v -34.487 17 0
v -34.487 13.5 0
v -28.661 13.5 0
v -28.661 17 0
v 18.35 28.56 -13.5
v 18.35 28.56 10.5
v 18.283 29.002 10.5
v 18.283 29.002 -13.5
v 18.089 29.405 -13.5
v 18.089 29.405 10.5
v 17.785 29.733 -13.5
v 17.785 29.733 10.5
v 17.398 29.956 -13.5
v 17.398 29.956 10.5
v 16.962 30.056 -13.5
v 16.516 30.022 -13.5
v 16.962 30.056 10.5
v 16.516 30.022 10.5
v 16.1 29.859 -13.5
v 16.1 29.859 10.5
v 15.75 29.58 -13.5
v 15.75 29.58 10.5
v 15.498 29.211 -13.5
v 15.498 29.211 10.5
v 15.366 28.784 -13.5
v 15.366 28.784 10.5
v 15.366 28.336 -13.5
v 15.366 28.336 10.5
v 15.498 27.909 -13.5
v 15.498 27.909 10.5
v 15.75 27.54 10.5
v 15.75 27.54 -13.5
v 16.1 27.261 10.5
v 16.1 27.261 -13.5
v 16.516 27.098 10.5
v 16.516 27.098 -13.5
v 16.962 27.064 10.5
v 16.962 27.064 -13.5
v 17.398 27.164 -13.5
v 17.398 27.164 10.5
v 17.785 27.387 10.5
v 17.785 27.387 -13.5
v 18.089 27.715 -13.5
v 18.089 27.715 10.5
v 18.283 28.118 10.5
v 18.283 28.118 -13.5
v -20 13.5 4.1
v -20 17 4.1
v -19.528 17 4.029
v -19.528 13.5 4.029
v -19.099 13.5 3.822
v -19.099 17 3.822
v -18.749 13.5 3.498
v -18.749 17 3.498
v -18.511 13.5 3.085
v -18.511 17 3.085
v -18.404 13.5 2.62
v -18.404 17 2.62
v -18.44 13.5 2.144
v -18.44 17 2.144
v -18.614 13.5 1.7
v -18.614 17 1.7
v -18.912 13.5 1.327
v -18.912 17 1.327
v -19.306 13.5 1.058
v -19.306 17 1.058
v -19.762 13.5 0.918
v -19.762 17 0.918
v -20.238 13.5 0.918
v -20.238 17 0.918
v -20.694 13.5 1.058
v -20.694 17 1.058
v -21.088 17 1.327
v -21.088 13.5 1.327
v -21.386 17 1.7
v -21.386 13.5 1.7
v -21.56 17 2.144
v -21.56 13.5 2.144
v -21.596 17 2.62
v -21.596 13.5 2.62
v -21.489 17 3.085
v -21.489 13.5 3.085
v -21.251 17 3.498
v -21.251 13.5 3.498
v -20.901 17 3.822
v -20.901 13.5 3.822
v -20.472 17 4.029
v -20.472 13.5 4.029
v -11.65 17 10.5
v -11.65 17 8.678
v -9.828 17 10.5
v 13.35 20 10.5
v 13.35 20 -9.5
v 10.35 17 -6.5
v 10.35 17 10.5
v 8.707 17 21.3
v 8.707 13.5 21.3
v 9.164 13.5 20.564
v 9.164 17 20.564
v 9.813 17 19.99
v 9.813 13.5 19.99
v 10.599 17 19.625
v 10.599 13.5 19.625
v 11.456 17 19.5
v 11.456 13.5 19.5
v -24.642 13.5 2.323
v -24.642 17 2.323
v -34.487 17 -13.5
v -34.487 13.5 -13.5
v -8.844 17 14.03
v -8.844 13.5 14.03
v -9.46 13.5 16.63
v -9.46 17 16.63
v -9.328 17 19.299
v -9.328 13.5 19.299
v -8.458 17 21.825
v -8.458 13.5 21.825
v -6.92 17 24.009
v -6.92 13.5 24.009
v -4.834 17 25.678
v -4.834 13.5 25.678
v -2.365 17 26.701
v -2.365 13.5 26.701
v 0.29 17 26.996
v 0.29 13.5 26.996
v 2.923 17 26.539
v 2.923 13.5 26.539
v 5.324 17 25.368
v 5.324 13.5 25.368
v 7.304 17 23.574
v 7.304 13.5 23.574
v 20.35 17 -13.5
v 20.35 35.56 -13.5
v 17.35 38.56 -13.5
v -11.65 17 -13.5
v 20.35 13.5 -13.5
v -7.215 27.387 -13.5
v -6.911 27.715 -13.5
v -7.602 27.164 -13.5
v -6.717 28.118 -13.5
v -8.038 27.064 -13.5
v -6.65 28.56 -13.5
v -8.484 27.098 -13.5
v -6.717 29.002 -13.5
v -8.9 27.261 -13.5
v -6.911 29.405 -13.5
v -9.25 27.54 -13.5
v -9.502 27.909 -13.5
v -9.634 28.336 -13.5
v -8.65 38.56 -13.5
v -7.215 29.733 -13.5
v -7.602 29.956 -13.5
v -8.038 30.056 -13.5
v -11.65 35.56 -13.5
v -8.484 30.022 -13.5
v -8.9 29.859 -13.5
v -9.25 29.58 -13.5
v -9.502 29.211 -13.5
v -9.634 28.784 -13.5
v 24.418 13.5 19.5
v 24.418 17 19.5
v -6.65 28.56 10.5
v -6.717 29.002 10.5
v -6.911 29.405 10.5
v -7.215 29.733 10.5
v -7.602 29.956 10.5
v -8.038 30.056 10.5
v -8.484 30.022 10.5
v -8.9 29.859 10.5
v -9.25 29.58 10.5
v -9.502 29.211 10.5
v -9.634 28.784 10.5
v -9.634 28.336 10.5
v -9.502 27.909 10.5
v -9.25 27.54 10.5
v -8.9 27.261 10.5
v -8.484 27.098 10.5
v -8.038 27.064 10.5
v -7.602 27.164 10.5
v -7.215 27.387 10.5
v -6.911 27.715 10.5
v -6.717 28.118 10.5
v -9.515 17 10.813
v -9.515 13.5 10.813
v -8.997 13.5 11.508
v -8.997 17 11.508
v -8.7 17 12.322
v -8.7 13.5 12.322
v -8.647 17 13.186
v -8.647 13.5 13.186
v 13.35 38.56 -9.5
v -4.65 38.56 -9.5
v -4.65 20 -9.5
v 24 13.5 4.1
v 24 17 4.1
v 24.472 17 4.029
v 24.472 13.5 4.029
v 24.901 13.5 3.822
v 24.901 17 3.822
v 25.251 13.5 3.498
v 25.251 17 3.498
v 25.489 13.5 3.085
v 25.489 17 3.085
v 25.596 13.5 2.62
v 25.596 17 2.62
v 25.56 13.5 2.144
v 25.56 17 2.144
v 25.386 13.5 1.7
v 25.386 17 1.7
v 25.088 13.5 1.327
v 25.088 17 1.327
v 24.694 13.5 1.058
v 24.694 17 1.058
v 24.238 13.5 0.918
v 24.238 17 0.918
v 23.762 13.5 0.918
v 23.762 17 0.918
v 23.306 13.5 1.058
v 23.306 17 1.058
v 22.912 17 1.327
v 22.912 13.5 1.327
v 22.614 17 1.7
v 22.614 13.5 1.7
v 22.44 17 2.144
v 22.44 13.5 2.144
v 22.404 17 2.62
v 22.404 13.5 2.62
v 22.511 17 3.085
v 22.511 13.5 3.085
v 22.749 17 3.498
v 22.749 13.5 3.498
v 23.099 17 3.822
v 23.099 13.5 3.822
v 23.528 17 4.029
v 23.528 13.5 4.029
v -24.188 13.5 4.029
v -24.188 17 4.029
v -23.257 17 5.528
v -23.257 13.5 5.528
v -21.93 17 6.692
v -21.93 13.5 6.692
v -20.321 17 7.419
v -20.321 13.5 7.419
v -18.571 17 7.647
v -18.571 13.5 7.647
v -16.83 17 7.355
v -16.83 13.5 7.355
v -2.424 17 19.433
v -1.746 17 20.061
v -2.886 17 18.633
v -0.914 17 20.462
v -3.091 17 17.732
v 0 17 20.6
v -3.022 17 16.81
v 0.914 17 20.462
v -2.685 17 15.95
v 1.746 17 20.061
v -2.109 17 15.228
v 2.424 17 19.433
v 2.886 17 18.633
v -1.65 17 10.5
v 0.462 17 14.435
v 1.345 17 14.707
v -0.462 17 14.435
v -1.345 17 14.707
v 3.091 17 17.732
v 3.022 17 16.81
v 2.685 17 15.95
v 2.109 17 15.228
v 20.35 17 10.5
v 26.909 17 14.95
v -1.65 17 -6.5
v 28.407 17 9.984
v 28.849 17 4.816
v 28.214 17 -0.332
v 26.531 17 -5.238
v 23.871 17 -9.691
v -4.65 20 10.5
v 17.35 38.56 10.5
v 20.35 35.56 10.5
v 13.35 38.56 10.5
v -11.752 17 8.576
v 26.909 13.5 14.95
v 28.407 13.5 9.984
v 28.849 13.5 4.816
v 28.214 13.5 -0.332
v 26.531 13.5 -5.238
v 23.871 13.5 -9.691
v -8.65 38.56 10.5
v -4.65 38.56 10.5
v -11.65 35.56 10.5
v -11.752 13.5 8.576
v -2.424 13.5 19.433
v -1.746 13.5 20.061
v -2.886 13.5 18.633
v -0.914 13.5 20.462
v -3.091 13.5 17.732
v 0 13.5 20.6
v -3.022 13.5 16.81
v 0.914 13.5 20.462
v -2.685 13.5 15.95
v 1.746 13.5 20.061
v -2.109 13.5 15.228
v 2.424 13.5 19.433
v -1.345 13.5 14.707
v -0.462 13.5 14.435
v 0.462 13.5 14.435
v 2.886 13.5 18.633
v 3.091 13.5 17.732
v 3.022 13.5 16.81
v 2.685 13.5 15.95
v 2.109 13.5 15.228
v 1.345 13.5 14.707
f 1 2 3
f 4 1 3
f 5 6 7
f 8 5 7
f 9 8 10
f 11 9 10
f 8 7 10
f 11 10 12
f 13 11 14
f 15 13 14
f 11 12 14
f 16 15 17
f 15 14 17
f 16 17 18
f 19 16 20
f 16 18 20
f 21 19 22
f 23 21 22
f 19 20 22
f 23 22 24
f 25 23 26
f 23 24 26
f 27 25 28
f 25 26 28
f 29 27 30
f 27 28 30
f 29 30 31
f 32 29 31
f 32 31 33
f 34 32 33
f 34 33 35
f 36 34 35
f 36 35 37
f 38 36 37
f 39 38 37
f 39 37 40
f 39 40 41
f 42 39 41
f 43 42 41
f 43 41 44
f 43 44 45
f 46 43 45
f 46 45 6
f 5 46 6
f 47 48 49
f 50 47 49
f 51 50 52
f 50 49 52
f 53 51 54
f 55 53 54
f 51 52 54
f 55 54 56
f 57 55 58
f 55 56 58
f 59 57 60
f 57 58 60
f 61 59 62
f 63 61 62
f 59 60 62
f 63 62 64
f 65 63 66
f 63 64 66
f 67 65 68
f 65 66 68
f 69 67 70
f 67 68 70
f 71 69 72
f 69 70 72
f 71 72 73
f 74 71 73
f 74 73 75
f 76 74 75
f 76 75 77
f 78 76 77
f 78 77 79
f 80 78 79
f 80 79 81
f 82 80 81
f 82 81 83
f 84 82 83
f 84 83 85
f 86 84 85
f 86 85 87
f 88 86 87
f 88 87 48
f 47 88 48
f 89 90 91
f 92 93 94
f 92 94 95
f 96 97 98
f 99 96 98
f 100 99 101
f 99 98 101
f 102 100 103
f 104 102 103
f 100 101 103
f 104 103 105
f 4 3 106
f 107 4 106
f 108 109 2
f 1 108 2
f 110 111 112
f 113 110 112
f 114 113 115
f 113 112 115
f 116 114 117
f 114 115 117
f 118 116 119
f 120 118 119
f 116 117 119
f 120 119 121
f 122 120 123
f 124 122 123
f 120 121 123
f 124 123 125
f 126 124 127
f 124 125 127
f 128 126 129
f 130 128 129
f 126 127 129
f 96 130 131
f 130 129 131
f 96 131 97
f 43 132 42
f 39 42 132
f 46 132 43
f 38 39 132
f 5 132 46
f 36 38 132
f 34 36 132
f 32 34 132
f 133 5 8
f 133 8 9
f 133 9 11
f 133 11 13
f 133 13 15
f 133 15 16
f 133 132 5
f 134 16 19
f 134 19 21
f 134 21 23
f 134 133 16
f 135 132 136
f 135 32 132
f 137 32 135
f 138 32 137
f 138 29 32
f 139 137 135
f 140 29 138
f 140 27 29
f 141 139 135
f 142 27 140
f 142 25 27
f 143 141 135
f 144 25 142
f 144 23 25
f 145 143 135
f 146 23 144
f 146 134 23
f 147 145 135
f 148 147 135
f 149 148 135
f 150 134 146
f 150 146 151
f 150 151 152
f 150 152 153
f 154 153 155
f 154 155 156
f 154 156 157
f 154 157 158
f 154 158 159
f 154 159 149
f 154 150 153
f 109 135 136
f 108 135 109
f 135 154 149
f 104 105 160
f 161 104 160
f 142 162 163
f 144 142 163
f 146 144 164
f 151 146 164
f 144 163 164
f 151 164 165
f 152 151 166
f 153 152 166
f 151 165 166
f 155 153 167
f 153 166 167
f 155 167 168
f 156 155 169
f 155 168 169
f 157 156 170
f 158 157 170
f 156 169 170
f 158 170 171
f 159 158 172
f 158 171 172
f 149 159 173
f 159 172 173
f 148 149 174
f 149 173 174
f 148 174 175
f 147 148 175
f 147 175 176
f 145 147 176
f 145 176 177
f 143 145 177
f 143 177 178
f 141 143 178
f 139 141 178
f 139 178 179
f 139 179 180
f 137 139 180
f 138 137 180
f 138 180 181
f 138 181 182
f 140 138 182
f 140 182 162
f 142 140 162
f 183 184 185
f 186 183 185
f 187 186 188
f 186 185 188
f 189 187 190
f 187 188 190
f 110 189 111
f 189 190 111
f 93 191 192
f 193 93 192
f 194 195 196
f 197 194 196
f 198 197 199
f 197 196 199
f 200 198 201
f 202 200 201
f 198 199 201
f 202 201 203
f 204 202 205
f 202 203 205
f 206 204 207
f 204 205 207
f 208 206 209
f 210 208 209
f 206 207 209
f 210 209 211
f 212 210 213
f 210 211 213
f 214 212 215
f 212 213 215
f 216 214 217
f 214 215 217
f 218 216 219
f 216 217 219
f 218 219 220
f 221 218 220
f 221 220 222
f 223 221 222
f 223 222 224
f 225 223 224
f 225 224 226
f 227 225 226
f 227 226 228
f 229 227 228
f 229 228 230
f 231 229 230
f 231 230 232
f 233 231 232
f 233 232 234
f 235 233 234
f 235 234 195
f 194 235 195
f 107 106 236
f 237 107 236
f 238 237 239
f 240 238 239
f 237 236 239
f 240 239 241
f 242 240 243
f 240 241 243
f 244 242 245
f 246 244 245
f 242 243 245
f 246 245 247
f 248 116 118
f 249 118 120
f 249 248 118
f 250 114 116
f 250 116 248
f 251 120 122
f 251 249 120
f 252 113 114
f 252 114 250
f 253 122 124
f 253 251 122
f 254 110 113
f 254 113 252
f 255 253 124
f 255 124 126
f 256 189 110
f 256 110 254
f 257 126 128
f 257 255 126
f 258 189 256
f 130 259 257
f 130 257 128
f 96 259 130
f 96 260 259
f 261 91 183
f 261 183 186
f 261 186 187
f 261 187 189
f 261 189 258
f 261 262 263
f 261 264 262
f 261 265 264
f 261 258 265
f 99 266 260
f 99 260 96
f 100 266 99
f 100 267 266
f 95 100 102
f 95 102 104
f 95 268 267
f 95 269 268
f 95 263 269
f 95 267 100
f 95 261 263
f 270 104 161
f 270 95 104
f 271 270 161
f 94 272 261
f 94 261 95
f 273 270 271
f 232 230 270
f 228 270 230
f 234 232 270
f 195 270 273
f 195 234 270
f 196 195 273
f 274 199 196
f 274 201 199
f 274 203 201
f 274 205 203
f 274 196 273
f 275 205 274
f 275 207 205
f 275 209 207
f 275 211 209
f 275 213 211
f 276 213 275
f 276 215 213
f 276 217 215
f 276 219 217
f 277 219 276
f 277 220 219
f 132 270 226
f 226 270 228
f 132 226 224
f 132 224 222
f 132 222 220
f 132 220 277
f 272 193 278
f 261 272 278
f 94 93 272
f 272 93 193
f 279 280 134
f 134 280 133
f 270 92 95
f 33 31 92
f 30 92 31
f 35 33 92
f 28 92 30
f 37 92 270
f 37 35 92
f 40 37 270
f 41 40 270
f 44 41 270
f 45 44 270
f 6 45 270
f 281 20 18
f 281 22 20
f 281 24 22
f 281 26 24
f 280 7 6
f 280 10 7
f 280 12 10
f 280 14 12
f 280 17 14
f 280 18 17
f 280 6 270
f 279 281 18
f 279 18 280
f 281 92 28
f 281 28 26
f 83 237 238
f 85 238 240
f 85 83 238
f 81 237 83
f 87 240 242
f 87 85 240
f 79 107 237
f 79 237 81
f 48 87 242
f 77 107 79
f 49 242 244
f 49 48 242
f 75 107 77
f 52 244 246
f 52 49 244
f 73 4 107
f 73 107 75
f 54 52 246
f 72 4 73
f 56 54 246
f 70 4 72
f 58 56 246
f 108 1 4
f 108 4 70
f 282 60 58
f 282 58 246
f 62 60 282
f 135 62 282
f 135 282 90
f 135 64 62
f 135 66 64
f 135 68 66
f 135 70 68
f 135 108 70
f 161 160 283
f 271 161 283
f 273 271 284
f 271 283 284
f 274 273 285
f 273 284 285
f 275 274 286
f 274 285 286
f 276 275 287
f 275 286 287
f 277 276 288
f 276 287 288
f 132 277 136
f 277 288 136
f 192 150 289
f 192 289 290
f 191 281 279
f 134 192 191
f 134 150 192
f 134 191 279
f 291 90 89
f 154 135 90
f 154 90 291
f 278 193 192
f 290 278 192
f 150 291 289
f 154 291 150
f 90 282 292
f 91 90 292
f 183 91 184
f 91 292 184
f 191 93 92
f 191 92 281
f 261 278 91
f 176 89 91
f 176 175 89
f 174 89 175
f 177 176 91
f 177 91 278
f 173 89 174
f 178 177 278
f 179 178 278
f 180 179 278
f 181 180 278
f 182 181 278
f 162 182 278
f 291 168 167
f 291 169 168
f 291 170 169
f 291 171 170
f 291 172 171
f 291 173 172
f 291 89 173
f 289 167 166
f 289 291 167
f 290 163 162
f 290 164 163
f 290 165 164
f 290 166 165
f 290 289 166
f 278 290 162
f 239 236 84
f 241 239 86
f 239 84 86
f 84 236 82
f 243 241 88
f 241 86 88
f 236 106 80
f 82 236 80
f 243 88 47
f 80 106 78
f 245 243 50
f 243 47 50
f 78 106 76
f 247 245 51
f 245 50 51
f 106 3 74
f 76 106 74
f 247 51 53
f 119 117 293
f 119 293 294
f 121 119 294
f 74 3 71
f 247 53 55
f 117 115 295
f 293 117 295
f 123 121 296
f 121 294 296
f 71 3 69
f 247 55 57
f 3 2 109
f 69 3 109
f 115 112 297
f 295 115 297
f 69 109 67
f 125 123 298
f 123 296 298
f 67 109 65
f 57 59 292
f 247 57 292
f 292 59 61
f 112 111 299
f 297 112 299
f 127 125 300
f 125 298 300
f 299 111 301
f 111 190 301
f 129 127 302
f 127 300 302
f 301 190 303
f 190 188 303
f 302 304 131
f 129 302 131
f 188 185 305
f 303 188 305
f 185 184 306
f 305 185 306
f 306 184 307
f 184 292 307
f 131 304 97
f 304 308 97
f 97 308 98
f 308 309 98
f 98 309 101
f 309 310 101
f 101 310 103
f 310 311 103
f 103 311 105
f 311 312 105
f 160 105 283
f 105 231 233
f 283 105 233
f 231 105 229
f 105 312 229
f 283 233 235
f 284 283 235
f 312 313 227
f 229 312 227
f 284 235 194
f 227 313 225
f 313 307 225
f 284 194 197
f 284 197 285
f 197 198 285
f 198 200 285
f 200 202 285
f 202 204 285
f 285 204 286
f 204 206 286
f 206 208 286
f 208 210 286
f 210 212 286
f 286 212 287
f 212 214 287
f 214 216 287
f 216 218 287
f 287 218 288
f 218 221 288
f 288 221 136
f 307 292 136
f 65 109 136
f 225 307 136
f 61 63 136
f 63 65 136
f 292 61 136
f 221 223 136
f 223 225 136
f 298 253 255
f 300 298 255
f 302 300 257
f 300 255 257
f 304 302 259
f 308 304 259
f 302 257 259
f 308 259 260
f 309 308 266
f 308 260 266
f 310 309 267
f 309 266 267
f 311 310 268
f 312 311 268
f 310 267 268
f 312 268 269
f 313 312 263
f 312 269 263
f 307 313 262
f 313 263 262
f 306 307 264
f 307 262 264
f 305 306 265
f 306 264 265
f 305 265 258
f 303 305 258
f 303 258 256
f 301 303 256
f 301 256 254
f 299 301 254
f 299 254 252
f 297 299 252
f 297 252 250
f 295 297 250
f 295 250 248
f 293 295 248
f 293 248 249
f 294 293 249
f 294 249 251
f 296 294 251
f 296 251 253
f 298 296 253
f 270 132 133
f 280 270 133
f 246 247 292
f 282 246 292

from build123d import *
from build123d.topology import SkipClean

# Parameters (mm, degrees)
CROQUIS1_W              = 70
CROQUIS1_H              = 65
EXTRUIR1_DEPTH          = 3.5
CROQUIS2_R              = 3.1
EXTRUIR2_DEPTH          = 5
EXTRUIR3_DEPTH          = 10
CROQUIS4_OUTSIDE_W      = 91.294
CROQUIS4_OUTSIDE_H      = 86.294
EXTRUIR4_DEPTH          = 10
REDONDEO1_R             = 3
EXTRUIR5_DEPTH          = 13.5
EXTRUIR6_DEPTH          = 3.5
CROQUIS7_R              = 1.6
EXTRUIR7_DEPTH          = 47.982330447
CROQUIS8_R              = 3.1
EXTRUIR8_DEPTH          = 5
CROQUIS9_W              = 0.7
CROQUIS9_H              = 10.5
EXTRUIR9_DEPTH          = 10
EXTRUIR10_DEPTH         = 63.752948337
EXTRUIR10_DEPTH_BACK    = 10
CROQUIS10_W             = 3.0625
CROQUIS10_H             = 5
CROQUIS11_W             = 54.8364
CROQUIS11_H             = 30
SALIENTE_EXTRUIR1_DEPTH = 4
CROQUIS13_W             = 7
CROQUIS13_H             = 30
SALIENTE_EXTRUIR2_DEPTH = 20
CORTAR_EXTRUIR1_DEPTH   = 8.44
CROQUIS15_W             = 22.8364
CROQUIS15_H             = 21.56
CORTAR_EXTRUIR2_DEPTH   = 8.44
CHAFL_N2_SIZE           = 3
CROQUIS16_R             = 1.5
CORTAR_EXTRUIR3_DEPTH   = 58.02817702
CHAFL_N3_SIZE           = 3


with BuildPart() as part:
    # Croquis1 → Extruir1 (new body)
    with BuildSketch(Plane(origin=(0, 0, 0), x_dir=(1, 0, 0), z_dir=(0, 1, 0))):
        Rectangle(CROQUIS1_W, CROQUIS1_H)
    extrude(amount=EXTRUIR1_DEPTH)

    # Croquis2 → Extruir2 (cut)
    with BuildSketch(Plane(origin=(0, 3.5, 0), x_dir=(1, 0, 0), z_dir=(0, 1, 0))):
        with Locations(Location((0, -17.5, 0), (0, 0, 270))):
            Circle(CROQUIS2_R)
    extrude(amount=-EXTRUIR2_DEPTH, mode=Mode.SUBTRACT)

    # Croquis3 → Extruir3 (add)
    with BuildSketch(Plane(origin=(0, 3.5, 0), x_dir=(1, 0, 0), z_dir=(0, 1, 0))):
        with BuildLine():
            Line((-34.4868, 13.5), (20.3496, 13.5))
            Line((20.3496, 13.5), (20.3496, 0))
            Line((20.3496, 0), (17.146428199, 0))
            ThreePointArc((17.146428199, 0), (22.955777517, -8.939493087), (24.418230894, -19.5))
            Line((24.418230894, -19.5), (9.287087811, -19.5))
            ThreePointArc((9.287087811, -19.5), (-3.635492607, -26.276855559), (-7.981176331, -12.347250794))
            Line((-7.981176331, -12.347250794), (-18.680510212, -1.647916913))
            ThreePointArc((-18.680510212, -1.647916913), (-17.932408832, -0.806327142), (-17.146428199, 0))
            Line((-17.146428199, 0), (-34.4868, 0))
            Line((-34.4868, 0), (-34.4868, 13.5))
        make_face()
        with BuildLine():
            Line((-32.9868, 1.5), (-12.961481397, 1.5))
            ThreePointArc((-12.961481397, 1.5), (-14.868021343, 0.048274597), (-16.613165932, -1.593940849))
            Line((-16.613165932, -1.593940849), (-5.999348286, -12.207758495))
            ThreePointArc((-5.999348286, -12.207758495), (-3.061467459, -24.89103626), (7.984359711, -18))
            Line((7.984359711, -18), (22.994564575, -18))
            ThreePointArc((22.994564575, -18), (20.451694563, -6.977253708), (12.961481397, 1.5))
            Line((12.961481397, 1.5), (18.8496, 1.5))
            Line((18.8496, 1.5), (18.8496, 12))
            Line((18.8496, 12), (-32.9868, 12))
            Line((-32.9868, 12), (-32.9868, 1.5))
        make_face(mode=Mode.SUBTRACT)
    extrude(amount=EXTRUIR3_DEPTH)

    # Croquis4 outside → Extruir4 (cut)
    with SkipClean():  # the faces are left unmerged after this step: merging them gives an invalid solid
        with BuildSketch(Plane(origin=(0, 3.5, 0), x_dir=(1, 0, 0), z_dir=(0, 1, 0))):
            Rectangle(CROQUIS4_OUTSIDE_W, CROQUIS4_OUTSIDE_H)
            with BuildLine():
                Line((-34.4868, 0), (-17.146428199, 0))
                ThreePointArc((-17.146428199, 0), (-17.932408832, -0.806327142), (-18.680510212, -1.647916913))
                Line((-18.680510212, -1.647916913), (-7.981176331, -12.347250794))
                ThreePointArc((-7.981176331, -12.347250794), (-3.635492607, -26.276855559), (9.287087811, -19.5))
                Line((9.287087811, -19.5), (24.418230894, -19.5))
                ThreePointArc((24.418230894, -19.5), (22.955777517, -8.939493087), (17.146428199, 0))
                Line((17.146428199, 0), (20.3496, 0))
                Line((20.3496, 0), (20.3496, 13.5))
                Line((20.3496, 13.5), (-34.4868, 13.5))
                Line((-34.4868, 13.5), (-34.4868, 0))
            make_face(mode=Mode.SUBTRACT)
        extrude(amount=-EXTRUIR4_DEPTH, mode=Mode.SUBTRACT)

    # Redondeo1
    redondeo1_edges = [part.edges().sort_by_distance(p)[0] for p in [
        (-7.981176331, 8.5, 12.347250794),
        (9.287087811, 8.5, 19.5),
        (-5.999348286, 8.5, 12.207758495),
        (7.984359711, 8.5, 18),
    ]]
    fillet(redondeo1_edges, radius=REDONDEO1_R)

    # Croquis5 → Extruir5 (add)
    with SkipClean():  # the faces are left unmerged after this step: merging them gives an invalid solid
        with BuildSketch(Plane.XZ):
            with BuildLine():
                Line((-18.680510212, 1.647916913), (-14.437869525, 5.8905576))
                ThreePointArc((-14.437869525, 5.8905576), (-21.723092903, 6.819250451), (-24.449770984, 0))
                Line((-24.449770984, 0), (-17.146428199, 0))
                ThreePointArc((-17.146428199, 0), (-17.932408832, 0.806327142), (-18.680510212, 1.647916913))
            make_face()
            with BuildLine():
                Line((20.3496, 0), (20.3496, -13.5))
                ThreePointArc((20.3496, -13.5), (28.665212431, 2.225567304), (24.418230894, 19.5))
                ThreePointArc((24.418230894, 19.5), (22.955777517, 8.939493087), (17.146428199, 0))
                Line((17.146428199, 0), (20.3496, 0))
            make_face()
        extrude(amount=-EXTRUIR5_DEPTH)

    # Chaflán1
    # the kernel refuses this chamfer: 5, 4.044665138 mm, written as the material it adds along each edge
    with BuildSketch(Plane(origin=(-14.437869525, 3.5, 5.8905576), x_dir=(-0.8768595348589335, 0, 0.48074666522709736), z_dir=(0, 1, 0))) as chafl_n1_piece_1:
        with BuildLine():
            Line((2.949791971, 0), (-1.211824758, 3.780414953))
            Line((-1.211824758, 3.780414953), (-1.307822013, 3.752405544))
            ThreePointArc((-1.307822013, 3.752405544), (-0.651776703, 1.876825504), (-0.095997255, -0.02800941))
            Line((-0.095997255, -0.02800941), (0.02800941, -0.095997255))
            ThreePointArc((0.02800941, -0.095997255), (1.47002525, 0.136406993), (2.931105495, -0.098238565))
            Line((2.931105495, -0.098238565), (2.949791971, 0))
        make_face()
    extrude(amount=10)
    with BuildSketch(Plane(origin=(-24.449770984, 3.5, 0), x_dir=(-0.00803680374358312, 0, 0.9999677043712897), z_dir=(0, 1, 0))) as chafl_n1_piece_2:
        with BuildLine():
            Line((2.423263449, 0), (-0.064845869, -4.38542071))
            Line((-0.064845869, -4.38542071), (-0.164842639, -4.386224391))
            ThreePointArc((-0.164842639, -4.386224391), (-0.082377051, -2.193111839), (-0.09999677, -0.00080368))
            Line((-0.09999677, -0.00080368), (0.026691621, 0.096371974))
            ThreePointArc((0.026691621, 0.096371974), (1.204598314, -0.104316531), (2.411212242, 0.099271186))
            Line((2.411212242, 0.099271186), (2.423263449, 0))
        make_face()
    extrude(amount=10)
    with BuildSketch(Plane(origin=(-24.449770984, 0, 0), x_dir=(-0.9997395779240649, 0, -0.022820524363231547), z_dir=(0, 1, 0))) as chafl_n1_piece_3:
        with BuildLine():
            Line((4.385900112, 0), (-0.035828136, 2.422998574))
            Line((-0.035828136, 2.422998574), (-0.134910293, 2.409480951))
            ThreePointArc((-0.134910293, 2.409480951), (0.08649505, 1.206008973), (-0.096756078, 0.025263837))
            Line((-0.096756078, 0.025263837), (0.002282052, -0.099973958))
            ThreePointArc((0.002282052, -0.099973958), (2.194090072, -0.04994272), (4.388182164, -0.099973958))
            Line((4.388182164, -0.099973958), (4.385900112, 0))
        make_face()
    extrude(amount=3.5)
    with BuildSketch(Plane(origin=(-14.437869525, 0, 5.8905576), x_dir=(0.7254657554746629, 0, 0.6882582637597435), z_dir=(0, 1, 0))) as chafl_n1_piece_4:
        with BuildLine():
            Line((3.96989376, 0), (-0.900434913, -2.809001538))
            Line((-0.900434913, -2.809001538), (-0.98828054, -2.761219262))
            ThreePointArc((-0.98828054, -2.761219262), (-0.318834214, -1.441501248), (-0.099965384, 0.002630967))
            Line((-0.099965384, 0.002630967), (0.002630967, 0.099965384))
            ThreePointArc((0.002630967, 0.099965384), (1.986203869, 0.047760165), (3.972524727, 0.099965384))
            Line((3.972524727, 0.099965384), (3.96989376, 0))
        make_face()
    extrude(amount=3.5)


with BuildPart() as body_2:
    # Croquis6 → Extruir6 (new body)
    with BuildSketch(Plane(origin=(0, 13.5, 0), x_dir=(1, 0, 0), z_dir=(0, 1, 0))):
        with BuildLine():
            Line((-34.4868, 13.5), (-34.4868, 0))
            Line((-34.4868, 0), (-28.661374979, 0))
            Line((-28.661374979, 0), (-24.642400208, -2.323096648))
            ThreePointArc((-24.642400208, -2.323096648), (-21.929637735, -6.692039268), (-16.829963308, -7.355409896))
            Line((-16.829963308, -7.355409896), (-11.752306982, -8.576120143))
            Line((-11.752306982, -8.576120143), (-9.515139435, -10.813287689))
            ThreePointArc((-9.515139435, -10.813287689), (-8.69974084, -12.321679102), (-8.843709432, -14.030302105))
            ThreePointArc((-8.843709432, -14.030302105), (-3.635492607, -26.276855559), (8.70689382, -21.3))
            ThreePointArc((8.70689382, -21.3), (9.813271565, -19.99001992), (11.456439237, -19.5))
            Line((11.456439237, -19.5), (24.418230894, -19.5))
            ThreePointArc((24.418230894, -19.5), (28.665212431, -2.225567304), (20.3496, 13.5))
            Line((20.3496, 13.5), (-34.4868, 13.5))
        make_face()
    extrude(amount=EXTRUIR6_DEPTH)


with BuildPart() as extruir7_tool:
    # Croquis7 → Extruir7 (new, through all)
    with BuildSketch(Plane(origin=(0, 17, 0), x_dir=(1, 0, 0), z_dir=(0, 1, 0))):
        with Locations(Location((-20, -2.5, 0), (0, 0, 270))):
            Circle(CROQUIS7_R)
        with Locations(Location((24, -2.5, 0), (0, 0, 270))):
            Circle(CROQUIS7_R)
    extrude(amount=-EXTRUIR7_DEPTH)


with BuildPart() as part_1:
    add(part.part)

    # Extruir7: cut by extruir7_tool
    add(extruir7_tool.part, mode=Mode.SUBTRACT)

    # Croquis9 → Extruir9 (cut)
    with BuildSketch(Plane(origin=(0, 13.5, 0), x_dir=(1, 0, 0), z_dir=(0, 1, 0))):
        with Locations((19.1996, 6.75)):
            Rectangle(CROQUIS9_W, CROQUIS9_H)
    extrude(amount=-EXTRUIR9_DEPTH, mode=Mode.SUBTRACT)

    # Croquis10 → Extruir10 (cut, two sides: drawn at the far end of the back side and taken through both)
    with BuildSketch(Plane.ZY.offset(-19.5496).offset(-EXTRUIR10_DEPTH_BACK)):
        with Locations((-8.9375, 8.5)):
            Rectangle(CROQUIS10_W, CROQUIS10_H)
    extrude(amount=EXTRUIR10_DEPTH + EXTRUIR10_DEPTH_BACK, mode=Mode.SUBTRACT)


with BuildPart() as body_2_1:
    add(body_2.part)

    # Extruir7: cut by extruir7_tool
    add(extruir7_tool.part, mode=Mode.SUBTRACT)

    # Croquis8 → Extruir8 (cut)
    with BuildSketch(Plane(origin=(0, 17, 0), x_dir=(1, 0, 0), z_dir=(0, 1, 0))):
        with Locations(Location((0, -17.5, 0), (0, 0, 270))):
            Circle(CROQUIS8_R)
    extrude(amount=-EXTRUIR8_DEPTH, mode=Mode.SUBTRACT)

    # Croquis11 → Saliente-Extruir1 (add)
    with BuildSketch(Plane(origin=(0, 0, -13.5), x_dir=(-1, 0, 0), z_dir=(0, 0, -1))):
        with Locations((7.0686, 32)):
            Rectangle(CROQUIS11_W, CROQUIS11_H)
    extrude(amount=-SALIENTE_EXTRUIR1_DEPTH)

    # Croquis13 → Saliente-Extruir2 (add)
    with BuildSketch(Plane.XY.offset(-9.5)):
        with Locations((-8.1504, 32)):
            Rectangle(CROQUIS13_W, CROQUIS13_H)
        with Locations((16.8496, 32)):
            Rectangle(CROQUIS13_W, CROQUIS13_H)
    extrude(amount=SALIENTE_EXTRUIR2_DEPTH)

    # Croquis14 → Cortar-Extruir1 (cut)
    with BuildSketch(Plane(origin=(0, 47, 0), x_dir=(1, 0, 0), z_dir=(0, 1, 0))):
        Polygon((20.3496, 13.5), (-34.4868, 13.5), (-34.4868, 9.5), (-11.6504, 9.5), (-11.6504, -10.5), (-4.6504, -10.5), (-4.6504, 9.5), (13.3496, 9.5), (13.3496, -10.5), (20.3496, -10.5), align=None)
    extrude(amount=-CORTAR_EXTRUIR1_DEPTH, mode=Mode.SUBTRACT)

    # Croquis15 → Cortar-Extruir2 (cut)
    with BuildSketch(Plane.XY.offset(-9.5)):
        with Locations((-23.0686, 27.78)):
            Rectangle(CROQUIS15_W, CROQUIS15_H)
    extrude(amount=-CORTAR_EXTRUIR2_DEPTH, mode=Mode.SUBTRACT)

    # Chaflán2
    chafl_n2_edges = [body_2_1.edges().sort_by_distance(p)[0] for p in [
        (-4.6504, 17, 0.5),
        (4.3496, 17, -9.5),
        (13.3496, 17, 0.5),
    ]]
    chamfer(chafl_n2_edges, length=CHAFL_N2_SIZE)

    # Croquis16 → Cortar-Extruir3 (cut, through all)
    with BuildSketch(Plane.XY.offset(10.5)):
        with Locations((-8.1504, 28.56)):
            Circle(CROQUIS16_R)
        with Locations((16.8496, 28.56)):
            Circle(CROQUIS16_R)
    extrude(amount=-CORTAR_EXTRUIR3_DEPTH, mode=Mode.SUBTRACT)

    # Chaflán3
    chafl_n3_edges = [body_2_1.edges().sort_by_distance(p)[0] for p in [
        (20.3496, 38.56, -1.5),
        (-11.6504, 38.56, -1.5),
    ]]
    chamfer(chafl_n3_edges, length=CHAFL_N3_SIZE)


solid = body_2_1.part
